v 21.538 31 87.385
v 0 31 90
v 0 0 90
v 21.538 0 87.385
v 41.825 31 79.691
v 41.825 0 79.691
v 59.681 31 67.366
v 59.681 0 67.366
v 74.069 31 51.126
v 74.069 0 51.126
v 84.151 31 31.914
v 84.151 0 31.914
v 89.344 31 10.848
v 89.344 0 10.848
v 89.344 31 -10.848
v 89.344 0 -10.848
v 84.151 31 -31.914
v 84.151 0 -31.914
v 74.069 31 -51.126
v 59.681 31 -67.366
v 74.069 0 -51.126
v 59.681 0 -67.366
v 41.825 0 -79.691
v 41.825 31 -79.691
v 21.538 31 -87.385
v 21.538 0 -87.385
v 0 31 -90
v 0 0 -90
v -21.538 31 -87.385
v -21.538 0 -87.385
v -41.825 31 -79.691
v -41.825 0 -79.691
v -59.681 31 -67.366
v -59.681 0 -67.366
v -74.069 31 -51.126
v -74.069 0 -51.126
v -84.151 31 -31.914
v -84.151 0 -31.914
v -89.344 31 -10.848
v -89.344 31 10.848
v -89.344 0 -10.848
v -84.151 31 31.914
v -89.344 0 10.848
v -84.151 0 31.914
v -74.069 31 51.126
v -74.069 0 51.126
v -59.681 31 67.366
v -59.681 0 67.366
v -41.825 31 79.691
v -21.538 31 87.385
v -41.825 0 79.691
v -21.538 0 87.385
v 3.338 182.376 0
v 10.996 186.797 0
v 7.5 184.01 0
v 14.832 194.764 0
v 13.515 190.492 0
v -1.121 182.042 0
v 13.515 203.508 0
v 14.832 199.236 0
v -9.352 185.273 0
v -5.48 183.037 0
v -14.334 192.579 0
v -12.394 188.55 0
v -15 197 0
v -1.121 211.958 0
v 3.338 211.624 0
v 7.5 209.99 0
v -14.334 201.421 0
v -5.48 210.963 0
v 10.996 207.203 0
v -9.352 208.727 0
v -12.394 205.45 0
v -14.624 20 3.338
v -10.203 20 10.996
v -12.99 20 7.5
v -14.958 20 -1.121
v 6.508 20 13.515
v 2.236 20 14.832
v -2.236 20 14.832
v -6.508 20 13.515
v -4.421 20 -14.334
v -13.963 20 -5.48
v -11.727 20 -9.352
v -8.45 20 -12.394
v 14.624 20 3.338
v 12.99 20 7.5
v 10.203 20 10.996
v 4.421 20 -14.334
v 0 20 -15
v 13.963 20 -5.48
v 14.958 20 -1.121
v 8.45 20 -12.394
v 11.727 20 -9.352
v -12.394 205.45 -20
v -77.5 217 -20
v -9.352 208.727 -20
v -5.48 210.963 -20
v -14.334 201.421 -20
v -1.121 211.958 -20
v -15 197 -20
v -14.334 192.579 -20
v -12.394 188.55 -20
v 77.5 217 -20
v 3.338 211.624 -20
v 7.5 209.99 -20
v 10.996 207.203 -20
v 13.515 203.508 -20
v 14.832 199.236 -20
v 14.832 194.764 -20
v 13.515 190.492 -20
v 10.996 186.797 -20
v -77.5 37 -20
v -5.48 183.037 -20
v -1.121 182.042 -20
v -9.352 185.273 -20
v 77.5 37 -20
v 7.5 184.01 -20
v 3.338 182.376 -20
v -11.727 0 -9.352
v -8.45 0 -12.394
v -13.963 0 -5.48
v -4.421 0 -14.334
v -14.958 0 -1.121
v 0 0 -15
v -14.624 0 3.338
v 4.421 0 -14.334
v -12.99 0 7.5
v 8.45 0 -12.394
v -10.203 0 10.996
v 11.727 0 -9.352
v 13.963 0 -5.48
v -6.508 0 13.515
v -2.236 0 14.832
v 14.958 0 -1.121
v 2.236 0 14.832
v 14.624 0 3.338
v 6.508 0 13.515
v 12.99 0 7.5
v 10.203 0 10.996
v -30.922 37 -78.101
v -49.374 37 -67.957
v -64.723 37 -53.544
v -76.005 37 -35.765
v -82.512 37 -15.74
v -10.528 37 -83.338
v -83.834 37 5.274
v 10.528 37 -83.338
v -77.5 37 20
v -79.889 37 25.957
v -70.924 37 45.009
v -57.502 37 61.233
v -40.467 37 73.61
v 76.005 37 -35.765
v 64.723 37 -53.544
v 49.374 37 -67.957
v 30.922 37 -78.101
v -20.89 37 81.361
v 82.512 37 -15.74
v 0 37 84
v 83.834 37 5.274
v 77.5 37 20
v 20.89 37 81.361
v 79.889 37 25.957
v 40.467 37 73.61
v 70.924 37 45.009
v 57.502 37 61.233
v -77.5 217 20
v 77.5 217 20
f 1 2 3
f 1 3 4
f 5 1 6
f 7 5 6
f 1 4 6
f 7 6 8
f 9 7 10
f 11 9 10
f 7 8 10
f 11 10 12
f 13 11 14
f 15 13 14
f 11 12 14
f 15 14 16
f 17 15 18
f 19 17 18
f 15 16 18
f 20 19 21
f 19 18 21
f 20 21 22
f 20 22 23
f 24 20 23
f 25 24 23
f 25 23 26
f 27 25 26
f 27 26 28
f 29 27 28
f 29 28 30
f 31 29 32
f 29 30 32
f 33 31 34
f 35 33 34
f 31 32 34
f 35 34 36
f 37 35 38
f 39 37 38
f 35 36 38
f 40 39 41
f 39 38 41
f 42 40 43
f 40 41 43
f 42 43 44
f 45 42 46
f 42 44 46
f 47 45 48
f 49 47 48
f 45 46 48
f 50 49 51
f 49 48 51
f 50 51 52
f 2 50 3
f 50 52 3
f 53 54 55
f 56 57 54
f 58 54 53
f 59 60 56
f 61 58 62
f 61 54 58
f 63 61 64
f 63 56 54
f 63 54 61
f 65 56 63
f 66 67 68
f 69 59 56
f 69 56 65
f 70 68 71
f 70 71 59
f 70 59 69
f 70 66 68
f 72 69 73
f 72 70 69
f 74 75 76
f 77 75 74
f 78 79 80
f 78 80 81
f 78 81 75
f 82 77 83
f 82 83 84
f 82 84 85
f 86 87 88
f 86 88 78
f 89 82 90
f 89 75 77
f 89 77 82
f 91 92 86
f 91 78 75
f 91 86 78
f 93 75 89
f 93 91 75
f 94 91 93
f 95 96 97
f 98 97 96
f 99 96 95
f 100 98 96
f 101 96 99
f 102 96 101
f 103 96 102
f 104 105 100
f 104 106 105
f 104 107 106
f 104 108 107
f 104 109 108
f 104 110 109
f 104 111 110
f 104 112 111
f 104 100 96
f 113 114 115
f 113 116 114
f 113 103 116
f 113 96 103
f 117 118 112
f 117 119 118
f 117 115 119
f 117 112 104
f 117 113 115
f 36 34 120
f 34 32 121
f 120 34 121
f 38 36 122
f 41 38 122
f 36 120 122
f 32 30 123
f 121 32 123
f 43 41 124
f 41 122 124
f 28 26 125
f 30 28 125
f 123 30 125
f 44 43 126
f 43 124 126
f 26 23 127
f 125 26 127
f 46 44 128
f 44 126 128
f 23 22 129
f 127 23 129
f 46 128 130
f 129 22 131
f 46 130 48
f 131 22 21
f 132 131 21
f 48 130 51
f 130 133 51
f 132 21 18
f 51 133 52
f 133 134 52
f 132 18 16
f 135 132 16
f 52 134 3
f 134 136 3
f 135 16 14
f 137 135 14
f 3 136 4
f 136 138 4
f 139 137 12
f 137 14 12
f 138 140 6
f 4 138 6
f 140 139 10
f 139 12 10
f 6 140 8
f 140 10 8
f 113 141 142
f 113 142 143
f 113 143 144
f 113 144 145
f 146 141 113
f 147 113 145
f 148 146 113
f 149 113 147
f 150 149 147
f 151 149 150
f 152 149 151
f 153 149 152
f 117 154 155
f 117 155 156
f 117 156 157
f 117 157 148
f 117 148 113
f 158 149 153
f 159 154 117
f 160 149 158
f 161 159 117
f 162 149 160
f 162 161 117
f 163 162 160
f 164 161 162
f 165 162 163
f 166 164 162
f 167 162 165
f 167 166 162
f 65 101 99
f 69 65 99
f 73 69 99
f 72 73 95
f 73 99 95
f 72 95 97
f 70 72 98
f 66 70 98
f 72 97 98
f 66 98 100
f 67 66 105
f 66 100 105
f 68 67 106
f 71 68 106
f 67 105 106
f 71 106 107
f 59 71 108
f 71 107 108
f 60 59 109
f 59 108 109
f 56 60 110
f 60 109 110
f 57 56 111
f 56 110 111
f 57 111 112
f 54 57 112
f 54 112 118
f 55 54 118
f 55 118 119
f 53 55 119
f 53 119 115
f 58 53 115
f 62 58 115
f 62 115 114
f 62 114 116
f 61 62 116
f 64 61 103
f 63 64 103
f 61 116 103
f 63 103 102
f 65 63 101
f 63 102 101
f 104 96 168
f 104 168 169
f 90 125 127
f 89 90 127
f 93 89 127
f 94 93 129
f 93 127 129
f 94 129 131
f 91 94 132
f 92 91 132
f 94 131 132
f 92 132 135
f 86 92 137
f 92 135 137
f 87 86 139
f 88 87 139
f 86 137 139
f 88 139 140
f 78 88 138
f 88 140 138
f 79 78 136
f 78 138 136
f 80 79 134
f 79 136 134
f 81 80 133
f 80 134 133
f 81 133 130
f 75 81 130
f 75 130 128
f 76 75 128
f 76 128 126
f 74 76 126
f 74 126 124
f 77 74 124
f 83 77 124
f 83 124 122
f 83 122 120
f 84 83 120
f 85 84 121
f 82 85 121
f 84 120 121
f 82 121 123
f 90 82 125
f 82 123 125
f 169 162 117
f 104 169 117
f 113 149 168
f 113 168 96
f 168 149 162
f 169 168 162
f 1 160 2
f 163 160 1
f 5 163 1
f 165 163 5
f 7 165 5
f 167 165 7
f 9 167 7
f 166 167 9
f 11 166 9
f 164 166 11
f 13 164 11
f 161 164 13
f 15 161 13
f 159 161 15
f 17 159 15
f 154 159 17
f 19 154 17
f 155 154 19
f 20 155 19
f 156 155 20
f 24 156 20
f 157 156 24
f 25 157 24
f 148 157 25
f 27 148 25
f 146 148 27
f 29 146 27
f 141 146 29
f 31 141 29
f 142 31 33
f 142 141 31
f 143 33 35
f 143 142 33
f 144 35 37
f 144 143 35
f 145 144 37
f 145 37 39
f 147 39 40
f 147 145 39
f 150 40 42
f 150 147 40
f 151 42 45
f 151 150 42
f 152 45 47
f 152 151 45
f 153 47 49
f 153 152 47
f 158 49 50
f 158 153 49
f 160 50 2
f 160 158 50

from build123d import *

# Parameters (mm, degrees)
SKETCH2_R           = 90
BOSS_EXTRUDE1_DEPTH = 37
CHAMFER1_SIZE       = 6
SKETCH3_W           = 155
SKETCH3_H           = 40
BOSS_EXTRUDE2_DEPTH = 180
SKETCH30_R          = 15
CUT_EXTRUDE1_DEPTH  = 20
SKETCH31_R          = 15
CUT_EXTRUDE2_DEPTH  = 20


with BuildPart() as part:
    # Sketch2 → Boss-Extrude1 (new body)
    with BuildSketch(Plane(origin=(0, 0, 0), x_dir=(1, 0, 0), z_dir=(0, 1, 0))):
        with Locations(Location((0, 0, 0), (0, 0, 270))):
            Circle(SKETCH2_R)
    extrude(amount=BOSS_EXTRUDE1_DEPTH)

    # Chamfer1
    chamfer1_edges = [part.edges().sort_by_distance(p)[0] for p in [
        (0, 37, -90),
    ]]
    chamfer(chamfer1_edges, length=CHAMFER1_SIZE)

    # Sketch3 → Boss-Extrude2 (add)
    with BuildSketch(Plane(origin=(0, 37, 0), x_dir=(1, 0, 0), z_dir=(0, 1, 0))):
        Rectangle(SKETCH3_W, SKETCH3_H)
    extrude(amount=BOSS_EXTRUDE2_DEPTH)

    # Sketch30 → Cut-Extrude1 (cut)
    with BuildSketch(Plane.XZ):
        with Locations(Location((0, 0, 0), (0, 0, 270))):
            Circle(SKETCH30_R)
    extrude(amount=-CUT_EXTRUDE1_DEPTH, mode=Mode.SUBTRACT)

    # Sketch31 → Cut-Extrude2 (cut)
    with BuildSketch(Plane(origin=(0, 0, -20), x_dir=(-1, 0, 0), z_dir=(0, 0, -1))):
        with Locations((0, 197)):
            Circle(SKETCH31_R)
    extrude(amount=-CUT_EXTRUDE2_DEPTH, mode=Mode.SUBTRACT)


solid = part.part
